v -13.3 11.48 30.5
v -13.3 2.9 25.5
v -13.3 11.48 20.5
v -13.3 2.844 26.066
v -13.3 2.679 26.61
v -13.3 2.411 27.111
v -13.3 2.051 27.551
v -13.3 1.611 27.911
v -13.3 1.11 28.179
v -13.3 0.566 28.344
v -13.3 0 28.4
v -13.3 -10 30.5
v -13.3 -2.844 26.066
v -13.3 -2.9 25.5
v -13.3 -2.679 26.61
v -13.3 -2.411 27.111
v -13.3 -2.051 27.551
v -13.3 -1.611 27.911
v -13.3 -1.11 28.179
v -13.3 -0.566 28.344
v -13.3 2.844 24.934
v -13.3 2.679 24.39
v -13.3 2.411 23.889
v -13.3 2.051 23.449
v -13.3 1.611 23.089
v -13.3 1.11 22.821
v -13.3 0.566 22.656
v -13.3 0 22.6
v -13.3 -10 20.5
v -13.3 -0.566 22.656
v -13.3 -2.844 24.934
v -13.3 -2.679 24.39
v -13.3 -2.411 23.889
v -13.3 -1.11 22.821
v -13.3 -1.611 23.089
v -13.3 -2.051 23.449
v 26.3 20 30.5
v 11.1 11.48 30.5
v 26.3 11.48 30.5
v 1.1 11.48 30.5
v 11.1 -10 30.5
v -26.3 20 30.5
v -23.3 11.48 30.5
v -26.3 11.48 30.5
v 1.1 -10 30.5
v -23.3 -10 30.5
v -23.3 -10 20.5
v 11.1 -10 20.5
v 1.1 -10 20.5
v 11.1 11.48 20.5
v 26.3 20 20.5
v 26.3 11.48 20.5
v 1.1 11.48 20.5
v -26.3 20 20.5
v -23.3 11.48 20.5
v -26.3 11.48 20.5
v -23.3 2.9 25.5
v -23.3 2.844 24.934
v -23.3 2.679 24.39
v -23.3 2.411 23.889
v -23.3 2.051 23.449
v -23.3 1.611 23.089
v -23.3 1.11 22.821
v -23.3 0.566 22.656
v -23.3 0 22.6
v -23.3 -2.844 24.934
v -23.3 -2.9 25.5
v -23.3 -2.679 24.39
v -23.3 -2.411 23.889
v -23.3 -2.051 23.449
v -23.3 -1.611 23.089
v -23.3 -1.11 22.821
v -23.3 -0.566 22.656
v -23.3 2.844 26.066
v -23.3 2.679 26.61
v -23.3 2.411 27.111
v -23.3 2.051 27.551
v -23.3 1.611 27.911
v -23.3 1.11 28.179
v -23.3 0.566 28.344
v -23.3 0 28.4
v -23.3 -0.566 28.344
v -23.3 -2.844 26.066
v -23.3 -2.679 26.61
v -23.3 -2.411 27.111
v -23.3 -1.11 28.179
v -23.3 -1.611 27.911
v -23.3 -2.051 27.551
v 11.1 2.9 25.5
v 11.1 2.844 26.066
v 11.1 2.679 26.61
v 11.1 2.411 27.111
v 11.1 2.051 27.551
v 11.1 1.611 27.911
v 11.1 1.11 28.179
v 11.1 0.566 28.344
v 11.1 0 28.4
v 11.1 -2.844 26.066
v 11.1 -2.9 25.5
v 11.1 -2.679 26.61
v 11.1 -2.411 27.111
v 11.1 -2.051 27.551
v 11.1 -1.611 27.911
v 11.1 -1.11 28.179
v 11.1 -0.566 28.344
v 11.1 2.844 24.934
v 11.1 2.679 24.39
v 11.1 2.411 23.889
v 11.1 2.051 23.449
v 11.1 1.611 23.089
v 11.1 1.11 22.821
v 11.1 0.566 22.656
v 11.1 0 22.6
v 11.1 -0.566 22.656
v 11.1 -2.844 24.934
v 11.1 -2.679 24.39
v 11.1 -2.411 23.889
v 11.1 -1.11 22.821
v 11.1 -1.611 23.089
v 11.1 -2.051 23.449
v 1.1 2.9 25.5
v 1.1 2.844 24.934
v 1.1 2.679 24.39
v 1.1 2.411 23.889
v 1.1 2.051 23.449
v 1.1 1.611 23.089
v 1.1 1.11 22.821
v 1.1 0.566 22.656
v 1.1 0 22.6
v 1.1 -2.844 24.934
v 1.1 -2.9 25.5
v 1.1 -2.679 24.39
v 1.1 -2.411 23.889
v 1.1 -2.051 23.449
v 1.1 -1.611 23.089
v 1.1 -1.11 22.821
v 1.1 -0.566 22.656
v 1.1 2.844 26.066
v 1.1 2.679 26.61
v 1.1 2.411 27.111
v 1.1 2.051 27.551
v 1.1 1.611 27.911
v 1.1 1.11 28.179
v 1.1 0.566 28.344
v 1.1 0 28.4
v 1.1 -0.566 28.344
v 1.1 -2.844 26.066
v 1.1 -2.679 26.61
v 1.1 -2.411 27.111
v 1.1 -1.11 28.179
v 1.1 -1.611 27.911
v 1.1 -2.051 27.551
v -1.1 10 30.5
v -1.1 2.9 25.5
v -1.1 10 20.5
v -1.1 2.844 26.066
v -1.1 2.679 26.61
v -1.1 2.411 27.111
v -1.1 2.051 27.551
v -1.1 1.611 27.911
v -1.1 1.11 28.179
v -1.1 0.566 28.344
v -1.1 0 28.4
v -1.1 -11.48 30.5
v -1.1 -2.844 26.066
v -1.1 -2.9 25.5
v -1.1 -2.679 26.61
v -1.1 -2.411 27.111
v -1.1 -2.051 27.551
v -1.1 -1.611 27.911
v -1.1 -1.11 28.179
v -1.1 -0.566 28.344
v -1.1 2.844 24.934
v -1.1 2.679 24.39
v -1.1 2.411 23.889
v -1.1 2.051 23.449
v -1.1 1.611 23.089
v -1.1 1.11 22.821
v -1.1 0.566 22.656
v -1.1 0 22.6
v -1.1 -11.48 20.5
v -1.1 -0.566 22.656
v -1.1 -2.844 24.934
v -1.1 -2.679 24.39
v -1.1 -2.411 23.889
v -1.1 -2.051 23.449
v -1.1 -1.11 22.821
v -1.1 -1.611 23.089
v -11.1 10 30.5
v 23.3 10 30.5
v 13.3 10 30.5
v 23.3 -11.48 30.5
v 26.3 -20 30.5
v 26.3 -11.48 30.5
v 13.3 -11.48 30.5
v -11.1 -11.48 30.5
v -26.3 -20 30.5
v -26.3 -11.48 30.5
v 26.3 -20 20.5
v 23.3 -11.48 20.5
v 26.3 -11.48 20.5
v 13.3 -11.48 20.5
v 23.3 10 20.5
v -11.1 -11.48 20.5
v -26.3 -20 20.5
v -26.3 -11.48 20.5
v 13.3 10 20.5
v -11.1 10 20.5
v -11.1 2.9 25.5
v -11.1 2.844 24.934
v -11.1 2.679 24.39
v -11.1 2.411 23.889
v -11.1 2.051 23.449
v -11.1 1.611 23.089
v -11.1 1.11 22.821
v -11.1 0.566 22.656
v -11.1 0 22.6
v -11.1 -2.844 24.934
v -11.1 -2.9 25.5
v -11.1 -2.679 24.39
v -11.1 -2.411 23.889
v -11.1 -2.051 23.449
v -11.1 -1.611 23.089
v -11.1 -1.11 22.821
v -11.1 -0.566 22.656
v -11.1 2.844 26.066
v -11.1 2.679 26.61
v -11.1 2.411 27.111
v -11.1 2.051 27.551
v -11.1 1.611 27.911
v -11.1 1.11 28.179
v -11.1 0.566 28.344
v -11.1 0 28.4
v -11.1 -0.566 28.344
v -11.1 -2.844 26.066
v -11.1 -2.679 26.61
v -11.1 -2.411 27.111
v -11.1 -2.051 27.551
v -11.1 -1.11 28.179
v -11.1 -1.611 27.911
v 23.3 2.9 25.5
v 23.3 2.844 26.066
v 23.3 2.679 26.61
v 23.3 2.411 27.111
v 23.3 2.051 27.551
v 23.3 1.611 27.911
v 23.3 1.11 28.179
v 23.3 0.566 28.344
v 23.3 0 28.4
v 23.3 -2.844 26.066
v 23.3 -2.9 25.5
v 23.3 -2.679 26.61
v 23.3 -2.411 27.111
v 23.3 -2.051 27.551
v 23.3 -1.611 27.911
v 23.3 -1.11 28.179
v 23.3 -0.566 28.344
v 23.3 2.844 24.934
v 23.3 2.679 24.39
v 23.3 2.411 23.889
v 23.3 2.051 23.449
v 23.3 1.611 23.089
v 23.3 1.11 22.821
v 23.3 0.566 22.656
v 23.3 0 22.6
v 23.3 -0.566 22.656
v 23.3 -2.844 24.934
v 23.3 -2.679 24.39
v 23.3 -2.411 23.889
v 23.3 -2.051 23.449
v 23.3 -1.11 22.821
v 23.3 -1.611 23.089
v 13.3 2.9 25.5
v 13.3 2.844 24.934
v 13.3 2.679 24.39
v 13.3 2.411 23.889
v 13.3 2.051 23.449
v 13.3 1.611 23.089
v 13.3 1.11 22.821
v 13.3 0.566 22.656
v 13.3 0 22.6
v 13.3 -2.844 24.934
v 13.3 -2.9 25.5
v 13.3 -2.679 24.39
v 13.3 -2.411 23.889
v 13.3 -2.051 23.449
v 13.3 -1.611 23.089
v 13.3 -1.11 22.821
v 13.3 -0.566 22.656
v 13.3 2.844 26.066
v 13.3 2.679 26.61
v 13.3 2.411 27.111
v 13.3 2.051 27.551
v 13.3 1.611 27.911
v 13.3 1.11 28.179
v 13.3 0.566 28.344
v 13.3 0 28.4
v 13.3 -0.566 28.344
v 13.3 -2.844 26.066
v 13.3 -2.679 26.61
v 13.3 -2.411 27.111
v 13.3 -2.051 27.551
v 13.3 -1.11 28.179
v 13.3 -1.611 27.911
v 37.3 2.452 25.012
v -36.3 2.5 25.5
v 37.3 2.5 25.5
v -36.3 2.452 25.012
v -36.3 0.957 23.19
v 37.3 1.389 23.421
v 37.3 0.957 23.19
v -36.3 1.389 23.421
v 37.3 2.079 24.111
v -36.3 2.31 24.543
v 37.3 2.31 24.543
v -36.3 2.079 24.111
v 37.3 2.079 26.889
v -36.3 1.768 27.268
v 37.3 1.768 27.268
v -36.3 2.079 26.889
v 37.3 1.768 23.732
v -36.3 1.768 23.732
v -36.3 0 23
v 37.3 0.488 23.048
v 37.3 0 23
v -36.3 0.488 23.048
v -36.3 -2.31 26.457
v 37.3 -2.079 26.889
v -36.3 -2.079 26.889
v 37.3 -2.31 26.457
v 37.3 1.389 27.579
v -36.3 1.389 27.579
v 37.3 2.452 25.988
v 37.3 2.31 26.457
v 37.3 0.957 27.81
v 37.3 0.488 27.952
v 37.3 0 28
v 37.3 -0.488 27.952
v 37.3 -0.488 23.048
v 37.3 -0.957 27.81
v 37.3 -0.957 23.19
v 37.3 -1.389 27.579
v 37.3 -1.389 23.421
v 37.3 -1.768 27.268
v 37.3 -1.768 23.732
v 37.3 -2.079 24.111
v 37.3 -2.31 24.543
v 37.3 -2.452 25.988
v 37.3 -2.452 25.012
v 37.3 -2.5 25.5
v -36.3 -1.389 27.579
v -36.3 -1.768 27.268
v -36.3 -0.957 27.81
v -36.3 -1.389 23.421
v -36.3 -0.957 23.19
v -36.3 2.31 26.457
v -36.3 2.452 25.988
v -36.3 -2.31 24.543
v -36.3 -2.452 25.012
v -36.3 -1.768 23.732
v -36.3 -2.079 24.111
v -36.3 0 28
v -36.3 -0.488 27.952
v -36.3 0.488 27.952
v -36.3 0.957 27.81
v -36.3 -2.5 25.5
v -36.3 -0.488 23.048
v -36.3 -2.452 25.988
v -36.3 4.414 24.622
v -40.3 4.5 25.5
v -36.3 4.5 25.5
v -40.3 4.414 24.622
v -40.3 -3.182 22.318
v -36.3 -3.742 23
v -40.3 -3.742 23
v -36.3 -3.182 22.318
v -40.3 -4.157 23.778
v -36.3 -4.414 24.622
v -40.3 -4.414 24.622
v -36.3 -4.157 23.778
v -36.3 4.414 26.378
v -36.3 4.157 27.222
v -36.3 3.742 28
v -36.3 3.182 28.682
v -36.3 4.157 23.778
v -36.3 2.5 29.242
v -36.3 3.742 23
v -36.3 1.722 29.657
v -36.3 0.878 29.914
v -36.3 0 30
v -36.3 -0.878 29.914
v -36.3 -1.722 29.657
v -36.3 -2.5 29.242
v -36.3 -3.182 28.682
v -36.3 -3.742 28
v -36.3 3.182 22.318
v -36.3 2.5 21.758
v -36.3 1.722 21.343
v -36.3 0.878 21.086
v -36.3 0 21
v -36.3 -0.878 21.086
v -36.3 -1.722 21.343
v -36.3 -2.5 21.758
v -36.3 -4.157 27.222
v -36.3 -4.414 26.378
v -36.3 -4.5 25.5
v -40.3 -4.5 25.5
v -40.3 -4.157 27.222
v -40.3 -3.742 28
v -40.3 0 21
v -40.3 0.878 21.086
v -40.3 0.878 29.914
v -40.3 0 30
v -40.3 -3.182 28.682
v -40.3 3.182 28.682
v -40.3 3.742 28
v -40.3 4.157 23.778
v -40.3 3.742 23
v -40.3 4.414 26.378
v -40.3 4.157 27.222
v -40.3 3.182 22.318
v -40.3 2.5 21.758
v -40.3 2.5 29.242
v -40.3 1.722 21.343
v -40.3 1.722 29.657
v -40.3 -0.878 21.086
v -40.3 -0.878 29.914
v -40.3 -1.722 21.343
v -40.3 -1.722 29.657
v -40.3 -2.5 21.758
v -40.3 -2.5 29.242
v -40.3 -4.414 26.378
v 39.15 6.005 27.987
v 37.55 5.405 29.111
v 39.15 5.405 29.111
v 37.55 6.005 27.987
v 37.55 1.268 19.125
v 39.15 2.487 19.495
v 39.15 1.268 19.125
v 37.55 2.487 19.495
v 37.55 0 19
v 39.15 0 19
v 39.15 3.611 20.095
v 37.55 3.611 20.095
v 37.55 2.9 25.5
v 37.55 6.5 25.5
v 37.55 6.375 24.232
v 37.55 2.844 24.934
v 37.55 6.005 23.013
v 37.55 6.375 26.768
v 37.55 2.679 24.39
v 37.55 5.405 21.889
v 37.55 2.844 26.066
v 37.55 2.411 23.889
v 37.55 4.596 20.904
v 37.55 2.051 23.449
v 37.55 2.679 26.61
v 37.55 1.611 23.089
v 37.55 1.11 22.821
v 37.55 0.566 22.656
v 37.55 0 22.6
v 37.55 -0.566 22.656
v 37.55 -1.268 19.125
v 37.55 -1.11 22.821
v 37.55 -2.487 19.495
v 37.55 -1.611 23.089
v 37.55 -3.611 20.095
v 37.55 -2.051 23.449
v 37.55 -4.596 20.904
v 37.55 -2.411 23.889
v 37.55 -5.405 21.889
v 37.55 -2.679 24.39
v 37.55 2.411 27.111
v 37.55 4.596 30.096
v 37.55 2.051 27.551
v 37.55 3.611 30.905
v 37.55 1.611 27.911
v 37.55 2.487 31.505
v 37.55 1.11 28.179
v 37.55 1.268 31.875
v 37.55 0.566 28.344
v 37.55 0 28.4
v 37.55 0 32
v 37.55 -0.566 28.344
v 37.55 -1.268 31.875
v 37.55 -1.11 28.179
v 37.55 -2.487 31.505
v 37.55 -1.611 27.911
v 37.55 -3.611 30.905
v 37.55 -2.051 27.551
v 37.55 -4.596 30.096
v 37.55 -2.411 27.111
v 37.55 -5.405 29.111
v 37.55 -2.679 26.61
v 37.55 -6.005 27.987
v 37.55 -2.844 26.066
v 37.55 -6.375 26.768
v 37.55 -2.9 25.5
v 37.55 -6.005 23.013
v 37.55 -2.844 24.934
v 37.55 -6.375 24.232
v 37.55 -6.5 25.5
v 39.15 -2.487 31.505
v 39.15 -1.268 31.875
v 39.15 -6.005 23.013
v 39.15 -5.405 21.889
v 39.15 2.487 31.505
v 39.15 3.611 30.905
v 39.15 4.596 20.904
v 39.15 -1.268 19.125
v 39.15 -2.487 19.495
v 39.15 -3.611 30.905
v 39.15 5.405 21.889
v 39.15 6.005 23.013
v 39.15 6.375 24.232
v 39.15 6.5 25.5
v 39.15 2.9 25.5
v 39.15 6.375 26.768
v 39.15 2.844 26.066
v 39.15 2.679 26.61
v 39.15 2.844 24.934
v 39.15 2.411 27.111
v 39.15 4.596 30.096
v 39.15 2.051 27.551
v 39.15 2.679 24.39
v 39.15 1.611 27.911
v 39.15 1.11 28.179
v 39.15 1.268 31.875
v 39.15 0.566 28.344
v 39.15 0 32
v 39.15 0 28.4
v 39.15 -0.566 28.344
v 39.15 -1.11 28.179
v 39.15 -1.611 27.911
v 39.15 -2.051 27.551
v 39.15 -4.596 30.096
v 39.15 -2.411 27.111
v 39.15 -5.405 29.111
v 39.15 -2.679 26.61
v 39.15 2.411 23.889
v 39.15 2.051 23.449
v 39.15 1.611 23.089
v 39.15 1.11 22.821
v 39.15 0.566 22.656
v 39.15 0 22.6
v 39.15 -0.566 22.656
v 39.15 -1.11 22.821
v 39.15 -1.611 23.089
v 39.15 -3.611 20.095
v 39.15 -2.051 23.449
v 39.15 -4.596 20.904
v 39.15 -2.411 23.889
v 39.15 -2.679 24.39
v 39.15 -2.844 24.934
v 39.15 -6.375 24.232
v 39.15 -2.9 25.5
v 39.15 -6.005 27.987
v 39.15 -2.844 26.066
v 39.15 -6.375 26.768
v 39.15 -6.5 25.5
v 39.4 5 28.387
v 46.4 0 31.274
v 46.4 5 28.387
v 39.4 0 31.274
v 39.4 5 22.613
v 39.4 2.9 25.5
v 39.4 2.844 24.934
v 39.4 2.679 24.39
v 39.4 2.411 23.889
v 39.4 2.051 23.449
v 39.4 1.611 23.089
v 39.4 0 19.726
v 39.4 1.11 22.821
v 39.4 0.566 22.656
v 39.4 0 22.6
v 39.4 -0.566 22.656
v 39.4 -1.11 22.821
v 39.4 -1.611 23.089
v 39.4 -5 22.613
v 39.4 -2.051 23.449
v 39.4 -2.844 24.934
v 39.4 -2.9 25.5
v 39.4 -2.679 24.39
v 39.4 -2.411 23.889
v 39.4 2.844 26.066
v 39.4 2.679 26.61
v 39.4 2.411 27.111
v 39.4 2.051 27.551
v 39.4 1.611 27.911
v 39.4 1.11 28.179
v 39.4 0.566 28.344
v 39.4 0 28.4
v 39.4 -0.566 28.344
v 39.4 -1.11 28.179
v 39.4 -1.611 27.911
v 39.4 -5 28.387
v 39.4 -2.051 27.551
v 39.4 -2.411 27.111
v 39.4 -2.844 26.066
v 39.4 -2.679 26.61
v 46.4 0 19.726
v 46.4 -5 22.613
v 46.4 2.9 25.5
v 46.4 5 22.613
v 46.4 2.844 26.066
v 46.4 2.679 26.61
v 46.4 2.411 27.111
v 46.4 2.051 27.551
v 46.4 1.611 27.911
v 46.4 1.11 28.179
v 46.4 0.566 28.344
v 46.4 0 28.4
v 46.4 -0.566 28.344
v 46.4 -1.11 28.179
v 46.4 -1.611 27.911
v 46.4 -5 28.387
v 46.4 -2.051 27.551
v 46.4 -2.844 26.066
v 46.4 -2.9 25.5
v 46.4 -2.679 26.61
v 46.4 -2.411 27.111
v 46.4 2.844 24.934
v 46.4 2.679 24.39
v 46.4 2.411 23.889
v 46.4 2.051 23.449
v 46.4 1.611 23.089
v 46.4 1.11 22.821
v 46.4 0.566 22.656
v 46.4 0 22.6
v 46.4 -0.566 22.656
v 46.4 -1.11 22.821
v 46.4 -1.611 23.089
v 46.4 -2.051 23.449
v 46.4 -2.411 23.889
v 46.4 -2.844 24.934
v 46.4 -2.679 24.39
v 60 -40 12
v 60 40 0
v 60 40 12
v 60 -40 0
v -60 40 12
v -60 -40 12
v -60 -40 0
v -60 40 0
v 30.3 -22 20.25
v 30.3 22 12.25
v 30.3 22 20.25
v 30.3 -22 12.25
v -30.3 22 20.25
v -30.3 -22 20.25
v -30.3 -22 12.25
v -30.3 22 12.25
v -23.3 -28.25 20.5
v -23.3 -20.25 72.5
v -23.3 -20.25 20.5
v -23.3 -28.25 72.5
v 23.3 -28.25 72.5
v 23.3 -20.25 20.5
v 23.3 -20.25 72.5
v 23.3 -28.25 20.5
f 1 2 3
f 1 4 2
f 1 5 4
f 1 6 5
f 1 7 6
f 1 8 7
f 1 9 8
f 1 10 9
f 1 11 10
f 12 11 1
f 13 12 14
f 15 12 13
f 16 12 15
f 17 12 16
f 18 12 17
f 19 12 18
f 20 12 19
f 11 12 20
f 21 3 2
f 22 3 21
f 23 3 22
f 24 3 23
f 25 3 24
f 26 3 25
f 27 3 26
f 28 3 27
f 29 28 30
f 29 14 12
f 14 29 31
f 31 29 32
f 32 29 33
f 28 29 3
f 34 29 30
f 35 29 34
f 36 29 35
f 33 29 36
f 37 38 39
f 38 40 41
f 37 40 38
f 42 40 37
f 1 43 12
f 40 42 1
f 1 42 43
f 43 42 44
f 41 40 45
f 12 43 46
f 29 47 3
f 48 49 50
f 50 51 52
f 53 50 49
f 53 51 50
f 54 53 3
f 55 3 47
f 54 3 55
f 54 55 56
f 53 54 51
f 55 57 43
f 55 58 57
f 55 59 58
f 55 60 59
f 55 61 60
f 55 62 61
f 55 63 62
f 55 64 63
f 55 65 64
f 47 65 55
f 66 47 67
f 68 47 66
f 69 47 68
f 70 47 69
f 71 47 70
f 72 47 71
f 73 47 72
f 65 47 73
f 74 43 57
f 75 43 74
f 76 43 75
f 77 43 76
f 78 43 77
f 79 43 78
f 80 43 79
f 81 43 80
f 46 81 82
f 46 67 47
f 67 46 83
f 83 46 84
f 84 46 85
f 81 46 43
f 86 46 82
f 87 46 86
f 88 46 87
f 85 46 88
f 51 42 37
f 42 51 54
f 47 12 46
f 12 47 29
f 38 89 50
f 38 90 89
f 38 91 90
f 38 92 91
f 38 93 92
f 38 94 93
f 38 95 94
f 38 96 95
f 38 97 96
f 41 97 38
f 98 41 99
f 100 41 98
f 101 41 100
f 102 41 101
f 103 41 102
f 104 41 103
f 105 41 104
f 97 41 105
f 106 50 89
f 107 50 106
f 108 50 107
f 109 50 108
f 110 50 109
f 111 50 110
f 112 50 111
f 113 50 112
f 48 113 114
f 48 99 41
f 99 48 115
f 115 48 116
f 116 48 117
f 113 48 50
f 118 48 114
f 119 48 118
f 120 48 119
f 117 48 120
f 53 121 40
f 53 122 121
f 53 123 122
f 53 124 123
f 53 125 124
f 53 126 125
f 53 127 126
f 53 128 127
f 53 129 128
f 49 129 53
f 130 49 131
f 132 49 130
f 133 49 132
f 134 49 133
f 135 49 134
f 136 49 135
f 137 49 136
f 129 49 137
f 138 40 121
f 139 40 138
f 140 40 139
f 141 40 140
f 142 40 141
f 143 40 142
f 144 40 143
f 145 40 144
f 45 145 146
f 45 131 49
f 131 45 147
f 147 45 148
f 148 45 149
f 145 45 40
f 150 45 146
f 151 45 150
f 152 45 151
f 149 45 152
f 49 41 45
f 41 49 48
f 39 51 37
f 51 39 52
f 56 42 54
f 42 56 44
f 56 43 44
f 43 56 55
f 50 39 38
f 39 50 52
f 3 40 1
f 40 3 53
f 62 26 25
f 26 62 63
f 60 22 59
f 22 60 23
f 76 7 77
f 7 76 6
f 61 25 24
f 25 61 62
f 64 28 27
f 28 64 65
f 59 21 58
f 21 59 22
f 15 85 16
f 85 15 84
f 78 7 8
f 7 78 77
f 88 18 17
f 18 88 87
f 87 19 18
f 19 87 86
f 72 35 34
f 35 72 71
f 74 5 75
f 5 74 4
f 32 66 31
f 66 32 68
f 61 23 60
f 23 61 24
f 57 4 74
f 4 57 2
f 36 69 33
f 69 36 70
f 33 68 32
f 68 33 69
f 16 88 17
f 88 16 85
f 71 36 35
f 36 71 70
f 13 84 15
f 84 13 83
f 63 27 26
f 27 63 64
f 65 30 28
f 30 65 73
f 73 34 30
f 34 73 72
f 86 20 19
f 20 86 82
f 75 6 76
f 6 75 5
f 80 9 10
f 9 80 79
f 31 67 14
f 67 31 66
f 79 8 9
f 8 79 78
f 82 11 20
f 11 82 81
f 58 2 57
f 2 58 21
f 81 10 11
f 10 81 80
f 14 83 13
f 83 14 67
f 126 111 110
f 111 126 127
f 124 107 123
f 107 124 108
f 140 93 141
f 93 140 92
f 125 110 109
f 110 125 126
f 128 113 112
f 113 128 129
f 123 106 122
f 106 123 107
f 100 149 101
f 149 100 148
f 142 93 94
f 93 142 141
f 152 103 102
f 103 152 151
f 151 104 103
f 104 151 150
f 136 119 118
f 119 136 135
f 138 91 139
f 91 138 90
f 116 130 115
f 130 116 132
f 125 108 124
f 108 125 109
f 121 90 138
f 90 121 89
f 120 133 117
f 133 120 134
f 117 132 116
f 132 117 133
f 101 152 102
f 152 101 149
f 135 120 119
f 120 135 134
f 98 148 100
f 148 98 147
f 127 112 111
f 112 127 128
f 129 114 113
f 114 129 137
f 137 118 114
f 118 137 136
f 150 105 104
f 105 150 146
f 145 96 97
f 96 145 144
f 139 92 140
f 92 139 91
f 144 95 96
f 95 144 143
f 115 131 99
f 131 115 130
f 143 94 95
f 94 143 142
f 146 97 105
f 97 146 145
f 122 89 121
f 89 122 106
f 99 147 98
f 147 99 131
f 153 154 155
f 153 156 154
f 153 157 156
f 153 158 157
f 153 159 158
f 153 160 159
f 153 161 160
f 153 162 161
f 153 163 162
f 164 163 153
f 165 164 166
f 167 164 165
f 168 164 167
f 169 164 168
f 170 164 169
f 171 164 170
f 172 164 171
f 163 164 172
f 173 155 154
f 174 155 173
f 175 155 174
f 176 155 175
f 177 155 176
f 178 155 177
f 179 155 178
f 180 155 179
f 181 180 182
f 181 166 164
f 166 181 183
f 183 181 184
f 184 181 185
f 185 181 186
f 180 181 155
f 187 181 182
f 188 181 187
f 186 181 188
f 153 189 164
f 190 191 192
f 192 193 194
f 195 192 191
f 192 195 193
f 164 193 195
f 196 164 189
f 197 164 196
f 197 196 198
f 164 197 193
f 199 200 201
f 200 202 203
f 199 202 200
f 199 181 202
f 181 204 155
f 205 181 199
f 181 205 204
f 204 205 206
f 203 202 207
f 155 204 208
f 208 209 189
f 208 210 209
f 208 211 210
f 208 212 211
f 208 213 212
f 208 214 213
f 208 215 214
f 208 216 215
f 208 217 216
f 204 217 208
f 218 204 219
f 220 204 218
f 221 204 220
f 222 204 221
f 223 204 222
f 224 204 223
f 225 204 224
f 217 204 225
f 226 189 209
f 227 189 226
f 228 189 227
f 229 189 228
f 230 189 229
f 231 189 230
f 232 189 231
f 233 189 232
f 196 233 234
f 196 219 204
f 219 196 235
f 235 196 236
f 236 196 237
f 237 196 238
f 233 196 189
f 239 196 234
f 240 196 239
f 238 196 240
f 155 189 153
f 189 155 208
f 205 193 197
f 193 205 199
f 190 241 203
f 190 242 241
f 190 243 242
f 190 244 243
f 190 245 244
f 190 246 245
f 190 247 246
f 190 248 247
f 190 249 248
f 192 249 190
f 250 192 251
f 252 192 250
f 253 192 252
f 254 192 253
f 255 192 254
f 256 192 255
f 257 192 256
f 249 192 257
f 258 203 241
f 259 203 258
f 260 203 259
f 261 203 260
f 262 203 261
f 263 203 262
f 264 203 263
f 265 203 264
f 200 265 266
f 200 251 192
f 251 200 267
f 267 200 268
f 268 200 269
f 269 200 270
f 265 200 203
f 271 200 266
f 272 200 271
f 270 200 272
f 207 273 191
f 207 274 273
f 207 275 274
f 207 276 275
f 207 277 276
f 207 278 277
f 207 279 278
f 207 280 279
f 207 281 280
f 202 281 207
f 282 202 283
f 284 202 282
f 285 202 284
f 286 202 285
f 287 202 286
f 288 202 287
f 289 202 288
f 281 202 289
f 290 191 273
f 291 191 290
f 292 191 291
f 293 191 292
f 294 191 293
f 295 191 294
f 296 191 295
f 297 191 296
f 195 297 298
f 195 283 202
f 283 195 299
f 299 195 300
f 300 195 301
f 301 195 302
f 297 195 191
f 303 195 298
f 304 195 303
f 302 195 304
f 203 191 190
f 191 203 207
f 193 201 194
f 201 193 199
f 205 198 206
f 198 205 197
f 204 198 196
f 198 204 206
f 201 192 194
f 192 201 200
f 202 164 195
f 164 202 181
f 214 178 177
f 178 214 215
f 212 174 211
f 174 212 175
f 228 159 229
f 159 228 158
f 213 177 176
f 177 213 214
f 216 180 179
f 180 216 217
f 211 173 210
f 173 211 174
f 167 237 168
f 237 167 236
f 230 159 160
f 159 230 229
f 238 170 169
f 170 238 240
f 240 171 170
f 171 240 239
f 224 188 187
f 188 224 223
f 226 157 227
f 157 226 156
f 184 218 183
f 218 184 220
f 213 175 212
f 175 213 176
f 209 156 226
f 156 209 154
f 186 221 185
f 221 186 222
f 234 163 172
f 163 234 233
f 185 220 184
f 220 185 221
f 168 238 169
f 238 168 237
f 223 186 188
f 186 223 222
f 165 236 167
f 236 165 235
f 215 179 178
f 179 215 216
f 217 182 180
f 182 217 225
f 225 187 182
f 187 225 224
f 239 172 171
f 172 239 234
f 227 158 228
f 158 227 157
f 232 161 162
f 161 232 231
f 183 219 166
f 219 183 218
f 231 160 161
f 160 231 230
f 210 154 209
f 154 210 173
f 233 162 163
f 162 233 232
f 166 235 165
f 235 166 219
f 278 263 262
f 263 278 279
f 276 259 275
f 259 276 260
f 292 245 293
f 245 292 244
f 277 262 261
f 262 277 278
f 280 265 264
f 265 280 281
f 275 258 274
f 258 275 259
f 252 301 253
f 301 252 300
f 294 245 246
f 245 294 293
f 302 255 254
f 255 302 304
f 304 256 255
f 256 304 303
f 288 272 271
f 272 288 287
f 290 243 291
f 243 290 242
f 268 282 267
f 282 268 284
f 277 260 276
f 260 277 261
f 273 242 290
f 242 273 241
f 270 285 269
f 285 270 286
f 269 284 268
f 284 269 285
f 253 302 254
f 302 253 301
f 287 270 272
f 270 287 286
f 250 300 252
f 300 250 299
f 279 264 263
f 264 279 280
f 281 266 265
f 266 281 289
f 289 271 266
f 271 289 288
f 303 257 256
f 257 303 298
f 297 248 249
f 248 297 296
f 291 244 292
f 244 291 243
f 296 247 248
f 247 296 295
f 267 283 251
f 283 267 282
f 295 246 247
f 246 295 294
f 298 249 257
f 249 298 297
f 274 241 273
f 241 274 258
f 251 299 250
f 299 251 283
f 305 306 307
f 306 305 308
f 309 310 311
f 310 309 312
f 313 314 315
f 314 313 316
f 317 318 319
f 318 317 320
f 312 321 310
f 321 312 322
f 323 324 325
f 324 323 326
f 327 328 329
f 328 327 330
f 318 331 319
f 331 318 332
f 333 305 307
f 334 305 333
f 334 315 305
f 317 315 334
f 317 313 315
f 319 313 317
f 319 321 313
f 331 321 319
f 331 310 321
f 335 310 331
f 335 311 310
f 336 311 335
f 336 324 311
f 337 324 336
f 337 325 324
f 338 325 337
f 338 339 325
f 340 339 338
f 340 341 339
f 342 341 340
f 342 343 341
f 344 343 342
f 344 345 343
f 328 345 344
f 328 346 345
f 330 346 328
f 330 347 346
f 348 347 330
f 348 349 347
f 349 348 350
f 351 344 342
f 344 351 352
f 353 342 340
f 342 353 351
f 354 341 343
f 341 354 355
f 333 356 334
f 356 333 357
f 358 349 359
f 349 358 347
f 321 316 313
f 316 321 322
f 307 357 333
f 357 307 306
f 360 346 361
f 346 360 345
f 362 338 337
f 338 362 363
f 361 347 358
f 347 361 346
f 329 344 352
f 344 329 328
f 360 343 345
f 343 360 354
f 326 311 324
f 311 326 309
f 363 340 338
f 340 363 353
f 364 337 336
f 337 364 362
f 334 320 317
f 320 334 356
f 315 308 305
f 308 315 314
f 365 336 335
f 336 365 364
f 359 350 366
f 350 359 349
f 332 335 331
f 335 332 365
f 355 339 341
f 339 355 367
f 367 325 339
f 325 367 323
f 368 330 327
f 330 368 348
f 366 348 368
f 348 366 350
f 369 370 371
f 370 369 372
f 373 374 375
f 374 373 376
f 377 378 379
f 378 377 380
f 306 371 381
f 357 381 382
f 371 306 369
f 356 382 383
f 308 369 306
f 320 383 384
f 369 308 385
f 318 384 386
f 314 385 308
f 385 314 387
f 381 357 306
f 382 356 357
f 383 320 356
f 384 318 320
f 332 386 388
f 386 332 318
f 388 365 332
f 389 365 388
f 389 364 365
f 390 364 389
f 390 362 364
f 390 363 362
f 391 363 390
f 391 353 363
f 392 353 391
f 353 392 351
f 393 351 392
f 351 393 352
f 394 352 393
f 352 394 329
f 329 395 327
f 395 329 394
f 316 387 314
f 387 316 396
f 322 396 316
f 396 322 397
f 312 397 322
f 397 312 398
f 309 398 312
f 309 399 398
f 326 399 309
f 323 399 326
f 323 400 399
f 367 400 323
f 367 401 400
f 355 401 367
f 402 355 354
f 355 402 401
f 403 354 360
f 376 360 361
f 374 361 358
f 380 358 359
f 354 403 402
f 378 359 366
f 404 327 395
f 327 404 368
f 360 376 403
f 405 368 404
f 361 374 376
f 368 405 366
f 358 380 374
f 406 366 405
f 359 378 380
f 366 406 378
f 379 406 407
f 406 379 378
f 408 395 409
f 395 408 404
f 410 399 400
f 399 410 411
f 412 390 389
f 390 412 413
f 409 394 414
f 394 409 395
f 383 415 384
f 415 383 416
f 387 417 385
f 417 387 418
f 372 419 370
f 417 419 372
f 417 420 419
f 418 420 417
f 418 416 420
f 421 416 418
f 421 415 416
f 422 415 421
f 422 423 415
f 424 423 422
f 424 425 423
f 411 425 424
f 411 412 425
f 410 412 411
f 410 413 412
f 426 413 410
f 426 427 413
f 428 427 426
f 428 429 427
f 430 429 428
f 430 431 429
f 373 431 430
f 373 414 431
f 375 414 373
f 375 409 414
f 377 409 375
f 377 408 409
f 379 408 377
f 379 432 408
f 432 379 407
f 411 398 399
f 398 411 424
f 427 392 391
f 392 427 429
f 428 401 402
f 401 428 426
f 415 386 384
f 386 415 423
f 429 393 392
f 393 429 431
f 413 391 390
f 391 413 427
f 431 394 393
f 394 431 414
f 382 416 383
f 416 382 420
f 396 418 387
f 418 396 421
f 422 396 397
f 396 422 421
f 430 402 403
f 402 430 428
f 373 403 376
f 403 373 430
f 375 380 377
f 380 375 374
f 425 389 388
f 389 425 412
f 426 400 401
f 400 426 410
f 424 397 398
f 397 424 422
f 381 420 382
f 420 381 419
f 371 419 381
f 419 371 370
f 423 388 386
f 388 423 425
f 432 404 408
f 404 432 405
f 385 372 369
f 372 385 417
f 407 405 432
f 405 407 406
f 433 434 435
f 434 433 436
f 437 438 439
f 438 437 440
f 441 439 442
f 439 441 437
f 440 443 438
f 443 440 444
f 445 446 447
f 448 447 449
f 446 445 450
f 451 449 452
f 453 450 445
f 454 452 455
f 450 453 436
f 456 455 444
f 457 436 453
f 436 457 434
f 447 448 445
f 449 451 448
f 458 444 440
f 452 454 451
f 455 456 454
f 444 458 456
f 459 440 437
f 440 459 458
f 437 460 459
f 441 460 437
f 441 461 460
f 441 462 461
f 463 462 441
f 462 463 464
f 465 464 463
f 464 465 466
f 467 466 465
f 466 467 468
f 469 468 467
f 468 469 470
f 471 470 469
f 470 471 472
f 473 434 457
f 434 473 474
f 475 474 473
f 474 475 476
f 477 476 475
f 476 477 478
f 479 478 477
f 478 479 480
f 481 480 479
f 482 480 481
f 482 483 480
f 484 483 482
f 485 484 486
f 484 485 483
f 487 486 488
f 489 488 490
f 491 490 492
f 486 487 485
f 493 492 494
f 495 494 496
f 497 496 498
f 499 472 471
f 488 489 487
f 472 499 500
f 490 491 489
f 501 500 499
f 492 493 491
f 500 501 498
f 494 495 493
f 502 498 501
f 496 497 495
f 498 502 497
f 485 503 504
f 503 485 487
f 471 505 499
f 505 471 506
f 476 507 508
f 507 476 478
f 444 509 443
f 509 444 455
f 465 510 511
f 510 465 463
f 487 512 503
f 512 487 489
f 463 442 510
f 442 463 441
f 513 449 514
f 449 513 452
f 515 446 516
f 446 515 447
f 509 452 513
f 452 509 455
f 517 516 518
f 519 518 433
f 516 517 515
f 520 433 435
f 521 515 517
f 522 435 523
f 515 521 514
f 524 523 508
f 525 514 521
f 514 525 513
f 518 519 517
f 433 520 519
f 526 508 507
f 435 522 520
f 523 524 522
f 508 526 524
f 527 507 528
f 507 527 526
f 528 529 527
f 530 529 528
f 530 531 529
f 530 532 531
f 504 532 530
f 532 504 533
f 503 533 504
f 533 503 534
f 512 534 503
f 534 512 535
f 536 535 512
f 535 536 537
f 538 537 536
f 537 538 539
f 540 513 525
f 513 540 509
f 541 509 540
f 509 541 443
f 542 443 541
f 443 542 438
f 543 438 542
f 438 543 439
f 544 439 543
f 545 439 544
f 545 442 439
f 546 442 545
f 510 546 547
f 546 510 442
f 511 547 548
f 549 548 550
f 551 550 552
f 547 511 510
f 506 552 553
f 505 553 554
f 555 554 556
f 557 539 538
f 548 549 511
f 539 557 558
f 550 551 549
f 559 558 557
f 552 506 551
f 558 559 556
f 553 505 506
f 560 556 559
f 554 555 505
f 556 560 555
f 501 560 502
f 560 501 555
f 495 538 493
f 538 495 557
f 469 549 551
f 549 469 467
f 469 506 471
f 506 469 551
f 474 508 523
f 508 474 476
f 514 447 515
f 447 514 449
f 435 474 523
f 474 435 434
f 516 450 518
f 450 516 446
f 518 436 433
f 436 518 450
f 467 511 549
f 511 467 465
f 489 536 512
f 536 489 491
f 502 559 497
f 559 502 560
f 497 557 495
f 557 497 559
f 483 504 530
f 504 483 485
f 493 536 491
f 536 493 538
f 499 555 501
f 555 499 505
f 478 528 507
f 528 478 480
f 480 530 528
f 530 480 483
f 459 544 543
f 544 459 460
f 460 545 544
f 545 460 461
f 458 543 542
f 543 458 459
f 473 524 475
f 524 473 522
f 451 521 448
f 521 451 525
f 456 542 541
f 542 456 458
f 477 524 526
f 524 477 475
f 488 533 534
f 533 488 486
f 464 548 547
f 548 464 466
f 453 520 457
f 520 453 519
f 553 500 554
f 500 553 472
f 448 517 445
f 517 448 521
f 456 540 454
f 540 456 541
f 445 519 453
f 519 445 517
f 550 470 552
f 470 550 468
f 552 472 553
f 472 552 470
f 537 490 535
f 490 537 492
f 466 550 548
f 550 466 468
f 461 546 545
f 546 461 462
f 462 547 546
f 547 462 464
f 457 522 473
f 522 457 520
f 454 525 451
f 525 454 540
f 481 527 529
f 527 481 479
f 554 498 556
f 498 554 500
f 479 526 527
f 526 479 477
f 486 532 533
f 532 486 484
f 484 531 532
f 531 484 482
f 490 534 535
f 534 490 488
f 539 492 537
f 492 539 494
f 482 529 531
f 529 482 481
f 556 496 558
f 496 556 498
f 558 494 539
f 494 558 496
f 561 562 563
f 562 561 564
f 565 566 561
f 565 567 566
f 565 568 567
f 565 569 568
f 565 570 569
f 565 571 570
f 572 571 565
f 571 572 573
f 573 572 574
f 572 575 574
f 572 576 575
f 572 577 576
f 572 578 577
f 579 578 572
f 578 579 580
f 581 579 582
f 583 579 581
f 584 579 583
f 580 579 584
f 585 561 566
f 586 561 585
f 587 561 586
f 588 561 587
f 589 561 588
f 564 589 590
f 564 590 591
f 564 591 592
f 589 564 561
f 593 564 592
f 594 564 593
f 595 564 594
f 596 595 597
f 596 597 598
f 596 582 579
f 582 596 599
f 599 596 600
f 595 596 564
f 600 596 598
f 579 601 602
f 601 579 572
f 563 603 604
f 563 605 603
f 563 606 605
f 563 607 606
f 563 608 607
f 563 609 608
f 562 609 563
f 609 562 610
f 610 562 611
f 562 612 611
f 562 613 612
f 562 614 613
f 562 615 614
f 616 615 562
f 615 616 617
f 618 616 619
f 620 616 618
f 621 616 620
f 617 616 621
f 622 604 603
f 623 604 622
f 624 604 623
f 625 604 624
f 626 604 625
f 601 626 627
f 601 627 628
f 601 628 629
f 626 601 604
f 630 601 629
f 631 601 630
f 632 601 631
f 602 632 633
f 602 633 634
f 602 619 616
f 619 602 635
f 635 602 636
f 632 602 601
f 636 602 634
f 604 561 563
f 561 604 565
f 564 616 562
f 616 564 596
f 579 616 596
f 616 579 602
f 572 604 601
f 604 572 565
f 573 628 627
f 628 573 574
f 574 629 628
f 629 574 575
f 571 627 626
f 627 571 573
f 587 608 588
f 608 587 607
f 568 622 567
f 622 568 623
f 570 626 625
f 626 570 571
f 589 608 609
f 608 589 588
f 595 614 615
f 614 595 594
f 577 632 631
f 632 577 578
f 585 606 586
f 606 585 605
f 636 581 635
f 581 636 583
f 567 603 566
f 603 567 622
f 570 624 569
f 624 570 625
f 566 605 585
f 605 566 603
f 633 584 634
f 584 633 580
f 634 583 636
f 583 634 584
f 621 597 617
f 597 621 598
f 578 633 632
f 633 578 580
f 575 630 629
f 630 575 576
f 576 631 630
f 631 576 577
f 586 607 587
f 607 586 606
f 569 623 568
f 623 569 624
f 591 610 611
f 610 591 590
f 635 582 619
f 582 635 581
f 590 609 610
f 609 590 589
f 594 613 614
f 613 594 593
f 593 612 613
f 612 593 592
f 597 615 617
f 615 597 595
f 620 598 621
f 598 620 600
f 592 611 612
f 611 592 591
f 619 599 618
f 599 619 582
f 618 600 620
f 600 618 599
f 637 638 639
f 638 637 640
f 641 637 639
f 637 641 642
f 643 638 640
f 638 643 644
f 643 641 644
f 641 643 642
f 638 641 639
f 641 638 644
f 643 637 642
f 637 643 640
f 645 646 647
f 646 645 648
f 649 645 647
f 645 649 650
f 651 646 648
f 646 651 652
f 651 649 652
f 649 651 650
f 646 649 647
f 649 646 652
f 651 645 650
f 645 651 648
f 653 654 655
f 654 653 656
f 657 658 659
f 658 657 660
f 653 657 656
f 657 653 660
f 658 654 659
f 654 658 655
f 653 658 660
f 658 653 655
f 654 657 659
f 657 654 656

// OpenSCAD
$fn = 32;

// ------------------------------------------------------------------------
// Comb hinge with flap: leaf 52.6 x 20 mm, pin d5, flap 52 mm
// Every part is its own module, assembly() places every instance.
// ------------------------------------------------------------------------

// --- part 1 ---
module hinge_bed() {
  difference() {
    translate([-60, -40, 0]) cube([120, 80, 12]);
  }
}

// --- part 2 ---
module hinge_riser() {
  difference() {
    translate([-30.3, -22, 0]) cube([60.6, 44, 8]);
  }
}

// --- part 3 ---
module hinge_leaf_a() {
  difference() {
    union() {
      translate([-23.3, -10, -5]) cube([10, 30, 10]);
      translate([1.1, -10, -5]) cube([10, 30, 10]);
      translate([-26.3, 11.48, -5]) cube([52.6, 8.52, 10]);
    }
    translate([-18.3, 0, 0]) rotate([0, 90, 0]) cylinder(h = 12, d = 5.8, center = true);
    translate([6.1, 0, 0]) rotate([0, 90, 0]) cylinder(h = 12, d = 5.8, center = true);
  }
}

// --- part 4 ---
module hinge_leaf_b() {
  difference() {
    union() {
      translate([-11.1, -20, -5]) cube([10, 30, 10]);
      translate([13.3, -20, -5]) cube([10, 30, 10]);
      translate([-26.3, -20, -5]) cube([52.6, 8.52, 10]);
    }
    translate([-6.1, 0, 0]) rotate([0, 90, 0]) cylinder(h = 12, d = 5.8, center = true);
    translate([18.3, 0, 0]) rotate([0, 90, 0]) cylinder(h = 12, d = 5.8, center = true);
  }
}

// --- part 5 ---
module hinge_flap() {
  difference() {
    translate([-23.3, -26, 0]) cube([46.6, 52, 8]);
  }
}

// --- part 6 ---
module hinge_pin() {
  rotate([0, 90, 0]) cylinder(h = 74.6, d = 5, center = true);
  translate([-40.3, 0, 0]) rotate([0, 90, 0]) cylinder(h = 4, d = 9);
}

// --- part 7 ---
module pin_washer() {
  difference() {
      translate([0, 0, 0]) cylinder(h = 1.6, d = 13);
      translate([0, 0, -1]) cylinder(h = 3.6, d = 5.8);
    }
}

// --- part 8 ---
module pin_nut() {
  difference() {
    linear_extrude(height = 7) polygon(points = [[5.774, 0], [2.887, 5], [-2.887, 5], [-5.774, 0], [-2.887, -5], [2.887, -5]]);
    translate([0, 0, -1]) cylinder(h = 9, d = 5.8);
  }
}

// --- assembly ---
module assembly() {
  color([0.80, 0.24, 0.20]) translate([0, 0, 0]) rotate([0, 0, 0]) hinge_bed();
  color([0.20, 0.45, 0.75]) translate([0, 0, 12.25]) rotate([0, 0, 0]) hinge_riser();
  color([0.25, 0.62, 0.32]) translate([0, 0, 25.5]) rotate([0, 0, 0]) hinge_leaf_a();
  color([0.92, 0.70, 0.18]) translate([0, 0, 25.5]) rotate([0, 0, 0]) hinge_leaf_b();
  color([0.58, 0.35, 0.70]) translate([0, -20.25, 46.5]) rotate([90, 0, 0]) hinge_flap();
  color([0.16, 0.66, 0.66]) translate([0, 0, 25.5]) rotate([0, 0, 0]) hinge_pin();
  color([0.85, 0.48, 0.18]) translate([37.55, 0, 25.5]) rotate([0, 90, 0]) pin_washer();
  color([0.55, 0.60, 0.65]) translate([39.4, 0, 25.5]) rotate([0, 90, 0]) pin_nut();
}

assembly();
